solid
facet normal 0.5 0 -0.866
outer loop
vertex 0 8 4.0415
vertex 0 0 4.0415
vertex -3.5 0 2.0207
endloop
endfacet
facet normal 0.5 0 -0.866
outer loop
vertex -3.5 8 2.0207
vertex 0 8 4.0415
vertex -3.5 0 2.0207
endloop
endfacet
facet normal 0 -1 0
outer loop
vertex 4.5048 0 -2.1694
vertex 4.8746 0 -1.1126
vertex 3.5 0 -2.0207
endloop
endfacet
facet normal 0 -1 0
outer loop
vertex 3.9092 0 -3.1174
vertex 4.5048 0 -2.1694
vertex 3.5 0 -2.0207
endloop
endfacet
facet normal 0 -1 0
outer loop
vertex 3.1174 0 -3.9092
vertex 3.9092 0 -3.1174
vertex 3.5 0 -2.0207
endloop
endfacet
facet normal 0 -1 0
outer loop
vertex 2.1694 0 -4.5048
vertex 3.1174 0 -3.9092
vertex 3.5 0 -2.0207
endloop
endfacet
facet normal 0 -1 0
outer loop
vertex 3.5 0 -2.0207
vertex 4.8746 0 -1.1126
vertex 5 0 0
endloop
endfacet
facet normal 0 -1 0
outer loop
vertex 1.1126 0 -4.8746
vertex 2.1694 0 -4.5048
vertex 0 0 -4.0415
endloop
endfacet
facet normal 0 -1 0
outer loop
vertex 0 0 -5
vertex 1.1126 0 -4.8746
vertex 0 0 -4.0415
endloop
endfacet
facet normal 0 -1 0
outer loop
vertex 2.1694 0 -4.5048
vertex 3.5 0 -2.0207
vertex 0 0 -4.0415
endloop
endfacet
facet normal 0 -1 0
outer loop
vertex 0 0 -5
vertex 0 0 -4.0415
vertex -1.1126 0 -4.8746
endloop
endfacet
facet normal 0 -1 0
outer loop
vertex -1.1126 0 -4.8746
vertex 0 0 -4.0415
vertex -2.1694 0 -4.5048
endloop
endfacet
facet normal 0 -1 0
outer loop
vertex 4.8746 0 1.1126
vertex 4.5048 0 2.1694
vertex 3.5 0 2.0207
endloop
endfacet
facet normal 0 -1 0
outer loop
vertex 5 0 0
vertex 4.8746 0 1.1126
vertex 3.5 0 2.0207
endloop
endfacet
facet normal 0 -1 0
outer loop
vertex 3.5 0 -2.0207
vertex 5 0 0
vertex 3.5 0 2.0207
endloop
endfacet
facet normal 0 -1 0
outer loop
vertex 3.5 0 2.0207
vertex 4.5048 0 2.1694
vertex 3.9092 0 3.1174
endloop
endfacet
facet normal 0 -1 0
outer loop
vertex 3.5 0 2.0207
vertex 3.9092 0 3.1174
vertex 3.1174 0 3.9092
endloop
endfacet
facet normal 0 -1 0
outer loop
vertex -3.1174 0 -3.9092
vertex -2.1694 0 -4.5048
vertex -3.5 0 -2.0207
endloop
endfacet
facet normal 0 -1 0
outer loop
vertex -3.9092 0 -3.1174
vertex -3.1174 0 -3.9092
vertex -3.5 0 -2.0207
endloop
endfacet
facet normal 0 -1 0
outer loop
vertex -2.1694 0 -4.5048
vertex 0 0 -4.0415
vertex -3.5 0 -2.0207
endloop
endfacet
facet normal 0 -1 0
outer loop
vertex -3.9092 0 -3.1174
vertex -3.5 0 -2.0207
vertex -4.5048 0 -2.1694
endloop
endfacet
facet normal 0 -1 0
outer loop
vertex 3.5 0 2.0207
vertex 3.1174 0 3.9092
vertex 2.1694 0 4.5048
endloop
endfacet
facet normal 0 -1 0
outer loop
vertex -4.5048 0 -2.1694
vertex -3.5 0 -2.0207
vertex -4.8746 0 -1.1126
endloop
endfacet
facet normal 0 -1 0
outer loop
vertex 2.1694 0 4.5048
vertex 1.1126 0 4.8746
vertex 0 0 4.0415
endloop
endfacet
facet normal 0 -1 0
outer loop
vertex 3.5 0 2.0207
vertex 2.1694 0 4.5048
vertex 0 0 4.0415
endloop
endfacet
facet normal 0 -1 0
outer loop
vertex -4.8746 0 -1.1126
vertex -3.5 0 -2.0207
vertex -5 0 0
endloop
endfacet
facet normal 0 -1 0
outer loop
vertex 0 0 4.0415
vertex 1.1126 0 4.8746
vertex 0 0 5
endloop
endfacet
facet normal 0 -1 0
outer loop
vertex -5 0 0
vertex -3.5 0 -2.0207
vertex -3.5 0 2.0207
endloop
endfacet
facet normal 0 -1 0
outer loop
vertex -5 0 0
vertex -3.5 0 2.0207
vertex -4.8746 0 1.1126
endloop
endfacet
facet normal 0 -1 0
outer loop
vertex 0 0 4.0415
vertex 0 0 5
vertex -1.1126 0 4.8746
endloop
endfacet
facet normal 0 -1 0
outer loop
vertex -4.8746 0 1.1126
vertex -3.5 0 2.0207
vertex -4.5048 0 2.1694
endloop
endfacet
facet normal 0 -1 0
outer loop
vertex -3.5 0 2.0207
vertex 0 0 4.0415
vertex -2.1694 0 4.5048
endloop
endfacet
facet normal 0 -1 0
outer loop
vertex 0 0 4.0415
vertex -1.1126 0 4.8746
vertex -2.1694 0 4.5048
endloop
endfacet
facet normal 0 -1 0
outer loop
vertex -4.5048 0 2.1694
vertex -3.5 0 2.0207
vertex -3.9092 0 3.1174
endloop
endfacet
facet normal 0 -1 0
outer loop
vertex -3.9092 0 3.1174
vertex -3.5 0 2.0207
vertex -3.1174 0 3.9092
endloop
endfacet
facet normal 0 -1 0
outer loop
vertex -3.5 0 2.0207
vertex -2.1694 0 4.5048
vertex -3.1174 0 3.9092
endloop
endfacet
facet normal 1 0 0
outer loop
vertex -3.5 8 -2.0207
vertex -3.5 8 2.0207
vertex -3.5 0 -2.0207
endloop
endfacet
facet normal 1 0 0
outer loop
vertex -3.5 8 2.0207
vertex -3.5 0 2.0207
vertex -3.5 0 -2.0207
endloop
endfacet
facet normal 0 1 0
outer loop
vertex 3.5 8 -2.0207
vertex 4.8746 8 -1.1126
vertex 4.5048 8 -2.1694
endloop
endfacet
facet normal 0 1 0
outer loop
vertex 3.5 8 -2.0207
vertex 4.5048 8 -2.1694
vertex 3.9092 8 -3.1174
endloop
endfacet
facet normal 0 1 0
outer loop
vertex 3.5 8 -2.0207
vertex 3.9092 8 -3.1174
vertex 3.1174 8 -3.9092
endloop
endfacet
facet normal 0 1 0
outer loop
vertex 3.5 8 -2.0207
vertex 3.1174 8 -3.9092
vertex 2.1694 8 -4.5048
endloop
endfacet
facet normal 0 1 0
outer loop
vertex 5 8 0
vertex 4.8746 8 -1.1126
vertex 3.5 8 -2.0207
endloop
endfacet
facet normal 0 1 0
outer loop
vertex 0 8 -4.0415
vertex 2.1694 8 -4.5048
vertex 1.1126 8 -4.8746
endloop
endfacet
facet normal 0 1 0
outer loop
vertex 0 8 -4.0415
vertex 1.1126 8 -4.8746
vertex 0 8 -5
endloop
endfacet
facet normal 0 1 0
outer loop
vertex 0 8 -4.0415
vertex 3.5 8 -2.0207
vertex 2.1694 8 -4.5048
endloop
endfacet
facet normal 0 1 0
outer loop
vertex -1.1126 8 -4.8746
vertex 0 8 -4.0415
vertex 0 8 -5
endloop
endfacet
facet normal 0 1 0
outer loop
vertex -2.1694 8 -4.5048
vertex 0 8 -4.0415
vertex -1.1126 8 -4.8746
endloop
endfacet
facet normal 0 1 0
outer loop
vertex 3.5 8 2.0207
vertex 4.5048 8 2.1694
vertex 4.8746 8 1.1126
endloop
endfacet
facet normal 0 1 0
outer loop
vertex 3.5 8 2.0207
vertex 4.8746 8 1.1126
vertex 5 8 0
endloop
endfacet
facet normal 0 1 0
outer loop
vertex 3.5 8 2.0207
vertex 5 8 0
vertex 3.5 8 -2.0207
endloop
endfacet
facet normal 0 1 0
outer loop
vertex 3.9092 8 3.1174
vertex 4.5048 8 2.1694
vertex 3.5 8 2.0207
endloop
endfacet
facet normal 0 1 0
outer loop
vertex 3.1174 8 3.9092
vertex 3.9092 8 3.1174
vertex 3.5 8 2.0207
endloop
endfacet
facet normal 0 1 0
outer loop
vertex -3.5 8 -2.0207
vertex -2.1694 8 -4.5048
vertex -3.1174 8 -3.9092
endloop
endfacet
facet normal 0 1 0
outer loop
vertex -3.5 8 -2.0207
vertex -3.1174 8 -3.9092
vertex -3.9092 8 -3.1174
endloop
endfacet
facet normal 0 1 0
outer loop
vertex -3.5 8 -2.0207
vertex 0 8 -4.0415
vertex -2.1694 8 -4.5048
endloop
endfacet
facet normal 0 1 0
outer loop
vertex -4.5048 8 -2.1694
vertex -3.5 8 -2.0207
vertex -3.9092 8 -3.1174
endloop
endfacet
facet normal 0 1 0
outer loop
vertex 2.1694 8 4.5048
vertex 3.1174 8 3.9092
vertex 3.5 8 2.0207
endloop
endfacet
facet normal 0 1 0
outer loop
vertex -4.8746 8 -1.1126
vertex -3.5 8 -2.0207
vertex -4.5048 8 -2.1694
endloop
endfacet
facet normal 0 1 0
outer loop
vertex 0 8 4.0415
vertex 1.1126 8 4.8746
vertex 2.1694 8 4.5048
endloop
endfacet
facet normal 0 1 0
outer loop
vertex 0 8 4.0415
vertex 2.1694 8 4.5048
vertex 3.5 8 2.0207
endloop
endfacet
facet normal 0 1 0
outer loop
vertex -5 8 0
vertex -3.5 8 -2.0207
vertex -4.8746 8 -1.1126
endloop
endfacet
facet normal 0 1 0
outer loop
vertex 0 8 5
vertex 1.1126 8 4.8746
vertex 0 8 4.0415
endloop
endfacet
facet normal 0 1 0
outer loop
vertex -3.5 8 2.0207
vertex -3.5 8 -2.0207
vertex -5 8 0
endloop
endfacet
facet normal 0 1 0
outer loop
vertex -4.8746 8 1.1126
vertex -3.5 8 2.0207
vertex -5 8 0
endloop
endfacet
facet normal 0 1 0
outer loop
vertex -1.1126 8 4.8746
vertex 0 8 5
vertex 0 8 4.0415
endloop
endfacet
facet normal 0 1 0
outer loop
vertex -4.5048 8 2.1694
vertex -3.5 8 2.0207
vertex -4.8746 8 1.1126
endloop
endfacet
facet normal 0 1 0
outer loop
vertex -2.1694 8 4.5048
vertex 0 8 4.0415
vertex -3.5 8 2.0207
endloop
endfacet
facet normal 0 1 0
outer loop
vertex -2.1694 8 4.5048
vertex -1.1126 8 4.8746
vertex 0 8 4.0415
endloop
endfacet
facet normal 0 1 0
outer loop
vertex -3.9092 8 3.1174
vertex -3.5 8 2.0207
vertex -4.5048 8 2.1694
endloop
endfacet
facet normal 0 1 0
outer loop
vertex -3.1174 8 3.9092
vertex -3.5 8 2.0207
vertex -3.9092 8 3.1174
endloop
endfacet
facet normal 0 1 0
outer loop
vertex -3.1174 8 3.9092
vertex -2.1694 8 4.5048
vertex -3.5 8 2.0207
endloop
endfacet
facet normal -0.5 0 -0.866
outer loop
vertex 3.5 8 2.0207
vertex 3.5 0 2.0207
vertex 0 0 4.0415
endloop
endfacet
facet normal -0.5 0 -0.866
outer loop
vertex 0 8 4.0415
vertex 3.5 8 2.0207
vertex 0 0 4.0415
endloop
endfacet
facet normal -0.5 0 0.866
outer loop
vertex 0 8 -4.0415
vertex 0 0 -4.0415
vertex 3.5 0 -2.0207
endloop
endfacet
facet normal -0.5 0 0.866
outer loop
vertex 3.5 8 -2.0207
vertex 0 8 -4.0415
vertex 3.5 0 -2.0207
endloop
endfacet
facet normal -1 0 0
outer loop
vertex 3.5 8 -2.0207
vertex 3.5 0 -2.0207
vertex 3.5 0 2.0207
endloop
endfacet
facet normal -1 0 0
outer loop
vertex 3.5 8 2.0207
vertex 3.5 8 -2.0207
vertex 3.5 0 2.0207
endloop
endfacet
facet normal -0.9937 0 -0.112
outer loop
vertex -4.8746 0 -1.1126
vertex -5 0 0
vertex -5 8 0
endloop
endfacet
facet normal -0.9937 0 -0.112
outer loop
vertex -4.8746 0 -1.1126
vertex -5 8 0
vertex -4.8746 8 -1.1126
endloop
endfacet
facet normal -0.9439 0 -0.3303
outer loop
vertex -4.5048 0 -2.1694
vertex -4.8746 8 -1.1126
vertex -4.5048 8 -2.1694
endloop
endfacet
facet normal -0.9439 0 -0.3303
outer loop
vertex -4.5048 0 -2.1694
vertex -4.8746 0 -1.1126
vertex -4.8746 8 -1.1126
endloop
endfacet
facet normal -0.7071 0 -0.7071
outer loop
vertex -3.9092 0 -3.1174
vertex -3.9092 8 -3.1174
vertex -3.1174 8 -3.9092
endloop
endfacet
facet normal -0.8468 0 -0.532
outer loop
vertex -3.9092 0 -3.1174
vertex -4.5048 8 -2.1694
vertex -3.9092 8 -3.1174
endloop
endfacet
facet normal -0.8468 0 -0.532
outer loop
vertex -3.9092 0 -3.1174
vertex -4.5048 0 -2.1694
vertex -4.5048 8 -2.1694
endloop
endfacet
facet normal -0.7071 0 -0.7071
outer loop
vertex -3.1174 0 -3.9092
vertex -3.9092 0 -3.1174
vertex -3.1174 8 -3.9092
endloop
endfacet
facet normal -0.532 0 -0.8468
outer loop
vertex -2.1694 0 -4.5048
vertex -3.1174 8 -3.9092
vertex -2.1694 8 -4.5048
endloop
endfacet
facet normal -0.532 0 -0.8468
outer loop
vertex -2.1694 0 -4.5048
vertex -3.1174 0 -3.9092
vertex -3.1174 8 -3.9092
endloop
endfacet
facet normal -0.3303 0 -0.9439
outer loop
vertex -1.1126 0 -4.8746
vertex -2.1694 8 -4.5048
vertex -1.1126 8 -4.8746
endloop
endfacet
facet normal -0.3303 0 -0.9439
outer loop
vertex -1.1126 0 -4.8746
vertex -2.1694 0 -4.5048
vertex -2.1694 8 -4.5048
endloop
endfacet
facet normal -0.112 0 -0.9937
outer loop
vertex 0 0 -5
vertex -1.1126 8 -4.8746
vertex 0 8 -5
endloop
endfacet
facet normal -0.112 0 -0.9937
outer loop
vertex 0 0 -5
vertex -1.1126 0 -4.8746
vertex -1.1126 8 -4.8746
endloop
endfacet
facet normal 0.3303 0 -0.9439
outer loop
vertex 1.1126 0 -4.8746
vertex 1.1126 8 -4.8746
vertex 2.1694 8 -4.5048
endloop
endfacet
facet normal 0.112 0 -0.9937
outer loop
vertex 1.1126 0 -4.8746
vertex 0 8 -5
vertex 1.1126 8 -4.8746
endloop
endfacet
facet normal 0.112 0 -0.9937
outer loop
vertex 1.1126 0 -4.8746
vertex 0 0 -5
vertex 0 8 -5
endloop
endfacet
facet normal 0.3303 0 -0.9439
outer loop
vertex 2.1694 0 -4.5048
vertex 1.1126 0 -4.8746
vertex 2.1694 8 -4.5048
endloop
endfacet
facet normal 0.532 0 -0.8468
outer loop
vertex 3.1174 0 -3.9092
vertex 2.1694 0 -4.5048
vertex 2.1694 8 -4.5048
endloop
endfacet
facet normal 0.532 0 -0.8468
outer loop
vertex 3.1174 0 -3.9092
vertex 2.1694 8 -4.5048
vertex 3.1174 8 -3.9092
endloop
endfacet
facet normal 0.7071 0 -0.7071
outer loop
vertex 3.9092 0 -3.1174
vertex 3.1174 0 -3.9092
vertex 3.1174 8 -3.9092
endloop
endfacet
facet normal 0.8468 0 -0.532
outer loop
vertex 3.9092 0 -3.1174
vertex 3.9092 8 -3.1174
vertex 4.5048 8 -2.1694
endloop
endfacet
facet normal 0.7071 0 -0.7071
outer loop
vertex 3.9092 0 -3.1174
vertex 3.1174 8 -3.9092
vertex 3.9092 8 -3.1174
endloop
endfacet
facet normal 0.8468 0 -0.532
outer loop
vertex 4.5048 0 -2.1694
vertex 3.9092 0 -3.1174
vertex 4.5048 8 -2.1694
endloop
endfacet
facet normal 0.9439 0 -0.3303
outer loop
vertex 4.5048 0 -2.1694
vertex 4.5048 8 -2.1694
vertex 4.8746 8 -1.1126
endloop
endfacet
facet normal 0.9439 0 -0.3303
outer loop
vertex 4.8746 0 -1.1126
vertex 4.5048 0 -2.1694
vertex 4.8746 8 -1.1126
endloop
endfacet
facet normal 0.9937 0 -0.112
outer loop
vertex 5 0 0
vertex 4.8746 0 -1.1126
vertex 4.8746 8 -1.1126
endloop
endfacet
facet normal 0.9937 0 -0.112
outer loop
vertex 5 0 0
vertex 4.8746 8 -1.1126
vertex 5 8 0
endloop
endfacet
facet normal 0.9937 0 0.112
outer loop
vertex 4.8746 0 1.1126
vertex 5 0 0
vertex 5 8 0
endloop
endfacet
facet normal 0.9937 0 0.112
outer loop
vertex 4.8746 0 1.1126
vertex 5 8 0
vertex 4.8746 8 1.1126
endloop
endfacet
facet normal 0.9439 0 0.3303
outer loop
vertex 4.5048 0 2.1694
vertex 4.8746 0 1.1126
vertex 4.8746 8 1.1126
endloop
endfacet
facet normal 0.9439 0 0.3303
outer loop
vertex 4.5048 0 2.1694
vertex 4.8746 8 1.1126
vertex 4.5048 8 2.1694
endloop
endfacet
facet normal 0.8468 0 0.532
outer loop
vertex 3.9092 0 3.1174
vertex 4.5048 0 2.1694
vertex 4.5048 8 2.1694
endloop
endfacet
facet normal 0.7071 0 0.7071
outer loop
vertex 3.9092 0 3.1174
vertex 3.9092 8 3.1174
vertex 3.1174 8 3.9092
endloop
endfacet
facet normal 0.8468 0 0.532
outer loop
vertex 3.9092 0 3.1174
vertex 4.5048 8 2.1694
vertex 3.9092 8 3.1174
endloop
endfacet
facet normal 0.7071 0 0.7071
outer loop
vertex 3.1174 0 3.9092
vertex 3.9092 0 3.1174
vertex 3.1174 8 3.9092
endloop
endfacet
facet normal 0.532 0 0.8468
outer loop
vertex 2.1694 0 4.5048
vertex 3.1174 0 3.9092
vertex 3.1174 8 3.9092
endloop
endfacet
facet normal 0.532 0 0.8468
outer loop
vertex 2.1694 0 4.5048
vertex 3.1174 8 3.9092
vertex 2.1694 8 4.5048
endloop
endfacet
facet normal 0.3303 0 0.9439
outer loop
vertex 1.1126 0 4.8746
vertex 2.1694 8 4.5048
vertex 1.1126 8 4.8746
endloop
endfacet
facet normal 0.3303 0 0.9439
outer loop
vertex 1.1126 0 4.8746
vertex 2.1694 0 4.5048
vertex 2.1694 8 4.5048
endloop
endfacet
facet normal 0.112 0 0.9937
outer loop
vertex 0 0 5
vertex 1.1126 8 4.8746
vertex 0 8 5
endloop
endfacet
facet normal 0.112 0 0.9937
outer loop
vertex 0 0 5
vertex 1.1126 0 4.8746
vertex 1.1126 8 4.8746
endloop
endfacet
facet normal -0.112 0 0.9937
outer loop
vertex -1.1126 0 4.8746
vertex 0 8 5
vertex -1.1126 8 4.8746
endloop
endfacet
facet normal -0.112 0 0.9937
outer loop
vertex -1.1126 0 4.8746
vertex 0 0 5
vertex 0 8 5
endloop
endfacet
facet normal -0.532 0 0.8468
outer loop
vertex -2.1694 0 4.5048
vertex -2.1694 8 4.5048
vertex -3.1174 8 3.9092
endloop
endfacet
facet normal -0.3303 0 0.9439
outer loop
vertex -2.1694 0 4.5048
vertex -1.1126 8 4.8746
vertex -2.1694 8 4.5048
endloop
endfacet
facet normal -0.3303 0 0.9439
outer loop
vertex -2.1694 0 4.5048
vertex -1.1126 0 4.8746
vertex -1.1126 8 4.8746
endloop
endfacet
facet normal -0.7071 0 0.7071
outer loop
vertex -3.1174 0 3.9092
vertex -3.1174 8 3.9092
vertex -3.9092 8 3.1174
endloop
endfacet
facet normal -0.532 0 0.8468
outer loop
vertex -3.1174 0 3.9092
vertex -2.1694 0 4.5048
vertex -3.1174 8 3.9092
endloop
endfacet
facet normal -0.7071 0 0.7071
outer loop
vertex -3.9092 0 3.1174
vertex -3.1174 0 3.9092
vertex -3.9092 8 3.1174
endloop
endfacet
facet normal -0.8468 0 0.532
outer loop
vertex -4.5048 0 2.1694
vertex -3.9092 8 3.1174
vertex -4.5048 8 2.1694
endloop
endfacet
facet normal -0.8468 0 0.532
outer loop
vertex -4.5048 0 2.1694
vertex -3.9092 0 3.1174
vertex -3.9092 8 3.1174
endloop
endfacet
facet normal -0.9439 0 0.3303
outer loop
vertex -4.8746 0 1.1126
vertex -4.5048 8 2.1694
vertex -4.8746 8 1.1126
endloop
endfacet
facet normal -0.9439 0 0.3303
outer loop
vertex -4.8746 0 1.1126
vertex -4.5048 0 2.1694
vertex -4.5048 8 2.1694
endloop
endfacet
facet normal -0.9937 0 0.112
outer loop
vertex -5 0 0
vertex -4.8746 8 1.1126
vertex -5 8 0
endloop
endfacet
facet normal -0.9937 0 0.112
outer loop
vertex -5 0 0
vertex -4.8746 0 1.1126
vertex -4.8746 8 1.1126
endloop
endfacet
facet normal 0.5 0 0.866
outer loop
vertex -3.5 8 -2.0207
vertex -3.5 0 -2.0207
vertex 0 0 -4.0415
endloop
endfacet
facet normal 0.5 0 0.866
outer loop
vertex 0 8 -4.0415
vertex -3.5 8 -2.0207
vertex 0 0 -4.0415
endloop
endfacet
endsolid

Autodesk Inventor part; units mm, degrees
ref_plane "YZ Plane" through (0, 0, 0) normal (1, 0, 0) x (0, 1, 0)
ref_plane "XZ Plane" through (0, 0, 0) normal (0, 1, 0) x (-1, 0, 0)
ref_plane "XY Plane" through (0, 0, 0) normal (0, 0, 1) x (1, 0, 0)
sketch "Sketch1" plane through (0, 0, 0) normal (0, 1, 0) x (-1, 0, 0)
  circle A0 centre (0, 0) radius 3.5 construction
  circle A1 centre (0, 0) radius 5
  line L0 (3.5, -2.0207) -> (0, -4.0415)
  line L1 (0, -4.0415) -> (-3.5, -2.0207)
  line L2 (-3.5, -2.0207) -> (-3.5, 2.0207)
  line L3 (-3.5, 2.0207) -> (0, 4.0415)
  line L4 (0, 4.0415) -> (3.5, 2.0207)
  line L5 (3.5, 2.0207) -> (3.5, -2.0207)
  point P0 (3.5, 0)
  dimension "d0" = 7
  dimension "d1" = 10
extrude "Extrusion1" add sketch "Sketch1" along normal blind 8
properties part number "8mm Rex Spacer"
